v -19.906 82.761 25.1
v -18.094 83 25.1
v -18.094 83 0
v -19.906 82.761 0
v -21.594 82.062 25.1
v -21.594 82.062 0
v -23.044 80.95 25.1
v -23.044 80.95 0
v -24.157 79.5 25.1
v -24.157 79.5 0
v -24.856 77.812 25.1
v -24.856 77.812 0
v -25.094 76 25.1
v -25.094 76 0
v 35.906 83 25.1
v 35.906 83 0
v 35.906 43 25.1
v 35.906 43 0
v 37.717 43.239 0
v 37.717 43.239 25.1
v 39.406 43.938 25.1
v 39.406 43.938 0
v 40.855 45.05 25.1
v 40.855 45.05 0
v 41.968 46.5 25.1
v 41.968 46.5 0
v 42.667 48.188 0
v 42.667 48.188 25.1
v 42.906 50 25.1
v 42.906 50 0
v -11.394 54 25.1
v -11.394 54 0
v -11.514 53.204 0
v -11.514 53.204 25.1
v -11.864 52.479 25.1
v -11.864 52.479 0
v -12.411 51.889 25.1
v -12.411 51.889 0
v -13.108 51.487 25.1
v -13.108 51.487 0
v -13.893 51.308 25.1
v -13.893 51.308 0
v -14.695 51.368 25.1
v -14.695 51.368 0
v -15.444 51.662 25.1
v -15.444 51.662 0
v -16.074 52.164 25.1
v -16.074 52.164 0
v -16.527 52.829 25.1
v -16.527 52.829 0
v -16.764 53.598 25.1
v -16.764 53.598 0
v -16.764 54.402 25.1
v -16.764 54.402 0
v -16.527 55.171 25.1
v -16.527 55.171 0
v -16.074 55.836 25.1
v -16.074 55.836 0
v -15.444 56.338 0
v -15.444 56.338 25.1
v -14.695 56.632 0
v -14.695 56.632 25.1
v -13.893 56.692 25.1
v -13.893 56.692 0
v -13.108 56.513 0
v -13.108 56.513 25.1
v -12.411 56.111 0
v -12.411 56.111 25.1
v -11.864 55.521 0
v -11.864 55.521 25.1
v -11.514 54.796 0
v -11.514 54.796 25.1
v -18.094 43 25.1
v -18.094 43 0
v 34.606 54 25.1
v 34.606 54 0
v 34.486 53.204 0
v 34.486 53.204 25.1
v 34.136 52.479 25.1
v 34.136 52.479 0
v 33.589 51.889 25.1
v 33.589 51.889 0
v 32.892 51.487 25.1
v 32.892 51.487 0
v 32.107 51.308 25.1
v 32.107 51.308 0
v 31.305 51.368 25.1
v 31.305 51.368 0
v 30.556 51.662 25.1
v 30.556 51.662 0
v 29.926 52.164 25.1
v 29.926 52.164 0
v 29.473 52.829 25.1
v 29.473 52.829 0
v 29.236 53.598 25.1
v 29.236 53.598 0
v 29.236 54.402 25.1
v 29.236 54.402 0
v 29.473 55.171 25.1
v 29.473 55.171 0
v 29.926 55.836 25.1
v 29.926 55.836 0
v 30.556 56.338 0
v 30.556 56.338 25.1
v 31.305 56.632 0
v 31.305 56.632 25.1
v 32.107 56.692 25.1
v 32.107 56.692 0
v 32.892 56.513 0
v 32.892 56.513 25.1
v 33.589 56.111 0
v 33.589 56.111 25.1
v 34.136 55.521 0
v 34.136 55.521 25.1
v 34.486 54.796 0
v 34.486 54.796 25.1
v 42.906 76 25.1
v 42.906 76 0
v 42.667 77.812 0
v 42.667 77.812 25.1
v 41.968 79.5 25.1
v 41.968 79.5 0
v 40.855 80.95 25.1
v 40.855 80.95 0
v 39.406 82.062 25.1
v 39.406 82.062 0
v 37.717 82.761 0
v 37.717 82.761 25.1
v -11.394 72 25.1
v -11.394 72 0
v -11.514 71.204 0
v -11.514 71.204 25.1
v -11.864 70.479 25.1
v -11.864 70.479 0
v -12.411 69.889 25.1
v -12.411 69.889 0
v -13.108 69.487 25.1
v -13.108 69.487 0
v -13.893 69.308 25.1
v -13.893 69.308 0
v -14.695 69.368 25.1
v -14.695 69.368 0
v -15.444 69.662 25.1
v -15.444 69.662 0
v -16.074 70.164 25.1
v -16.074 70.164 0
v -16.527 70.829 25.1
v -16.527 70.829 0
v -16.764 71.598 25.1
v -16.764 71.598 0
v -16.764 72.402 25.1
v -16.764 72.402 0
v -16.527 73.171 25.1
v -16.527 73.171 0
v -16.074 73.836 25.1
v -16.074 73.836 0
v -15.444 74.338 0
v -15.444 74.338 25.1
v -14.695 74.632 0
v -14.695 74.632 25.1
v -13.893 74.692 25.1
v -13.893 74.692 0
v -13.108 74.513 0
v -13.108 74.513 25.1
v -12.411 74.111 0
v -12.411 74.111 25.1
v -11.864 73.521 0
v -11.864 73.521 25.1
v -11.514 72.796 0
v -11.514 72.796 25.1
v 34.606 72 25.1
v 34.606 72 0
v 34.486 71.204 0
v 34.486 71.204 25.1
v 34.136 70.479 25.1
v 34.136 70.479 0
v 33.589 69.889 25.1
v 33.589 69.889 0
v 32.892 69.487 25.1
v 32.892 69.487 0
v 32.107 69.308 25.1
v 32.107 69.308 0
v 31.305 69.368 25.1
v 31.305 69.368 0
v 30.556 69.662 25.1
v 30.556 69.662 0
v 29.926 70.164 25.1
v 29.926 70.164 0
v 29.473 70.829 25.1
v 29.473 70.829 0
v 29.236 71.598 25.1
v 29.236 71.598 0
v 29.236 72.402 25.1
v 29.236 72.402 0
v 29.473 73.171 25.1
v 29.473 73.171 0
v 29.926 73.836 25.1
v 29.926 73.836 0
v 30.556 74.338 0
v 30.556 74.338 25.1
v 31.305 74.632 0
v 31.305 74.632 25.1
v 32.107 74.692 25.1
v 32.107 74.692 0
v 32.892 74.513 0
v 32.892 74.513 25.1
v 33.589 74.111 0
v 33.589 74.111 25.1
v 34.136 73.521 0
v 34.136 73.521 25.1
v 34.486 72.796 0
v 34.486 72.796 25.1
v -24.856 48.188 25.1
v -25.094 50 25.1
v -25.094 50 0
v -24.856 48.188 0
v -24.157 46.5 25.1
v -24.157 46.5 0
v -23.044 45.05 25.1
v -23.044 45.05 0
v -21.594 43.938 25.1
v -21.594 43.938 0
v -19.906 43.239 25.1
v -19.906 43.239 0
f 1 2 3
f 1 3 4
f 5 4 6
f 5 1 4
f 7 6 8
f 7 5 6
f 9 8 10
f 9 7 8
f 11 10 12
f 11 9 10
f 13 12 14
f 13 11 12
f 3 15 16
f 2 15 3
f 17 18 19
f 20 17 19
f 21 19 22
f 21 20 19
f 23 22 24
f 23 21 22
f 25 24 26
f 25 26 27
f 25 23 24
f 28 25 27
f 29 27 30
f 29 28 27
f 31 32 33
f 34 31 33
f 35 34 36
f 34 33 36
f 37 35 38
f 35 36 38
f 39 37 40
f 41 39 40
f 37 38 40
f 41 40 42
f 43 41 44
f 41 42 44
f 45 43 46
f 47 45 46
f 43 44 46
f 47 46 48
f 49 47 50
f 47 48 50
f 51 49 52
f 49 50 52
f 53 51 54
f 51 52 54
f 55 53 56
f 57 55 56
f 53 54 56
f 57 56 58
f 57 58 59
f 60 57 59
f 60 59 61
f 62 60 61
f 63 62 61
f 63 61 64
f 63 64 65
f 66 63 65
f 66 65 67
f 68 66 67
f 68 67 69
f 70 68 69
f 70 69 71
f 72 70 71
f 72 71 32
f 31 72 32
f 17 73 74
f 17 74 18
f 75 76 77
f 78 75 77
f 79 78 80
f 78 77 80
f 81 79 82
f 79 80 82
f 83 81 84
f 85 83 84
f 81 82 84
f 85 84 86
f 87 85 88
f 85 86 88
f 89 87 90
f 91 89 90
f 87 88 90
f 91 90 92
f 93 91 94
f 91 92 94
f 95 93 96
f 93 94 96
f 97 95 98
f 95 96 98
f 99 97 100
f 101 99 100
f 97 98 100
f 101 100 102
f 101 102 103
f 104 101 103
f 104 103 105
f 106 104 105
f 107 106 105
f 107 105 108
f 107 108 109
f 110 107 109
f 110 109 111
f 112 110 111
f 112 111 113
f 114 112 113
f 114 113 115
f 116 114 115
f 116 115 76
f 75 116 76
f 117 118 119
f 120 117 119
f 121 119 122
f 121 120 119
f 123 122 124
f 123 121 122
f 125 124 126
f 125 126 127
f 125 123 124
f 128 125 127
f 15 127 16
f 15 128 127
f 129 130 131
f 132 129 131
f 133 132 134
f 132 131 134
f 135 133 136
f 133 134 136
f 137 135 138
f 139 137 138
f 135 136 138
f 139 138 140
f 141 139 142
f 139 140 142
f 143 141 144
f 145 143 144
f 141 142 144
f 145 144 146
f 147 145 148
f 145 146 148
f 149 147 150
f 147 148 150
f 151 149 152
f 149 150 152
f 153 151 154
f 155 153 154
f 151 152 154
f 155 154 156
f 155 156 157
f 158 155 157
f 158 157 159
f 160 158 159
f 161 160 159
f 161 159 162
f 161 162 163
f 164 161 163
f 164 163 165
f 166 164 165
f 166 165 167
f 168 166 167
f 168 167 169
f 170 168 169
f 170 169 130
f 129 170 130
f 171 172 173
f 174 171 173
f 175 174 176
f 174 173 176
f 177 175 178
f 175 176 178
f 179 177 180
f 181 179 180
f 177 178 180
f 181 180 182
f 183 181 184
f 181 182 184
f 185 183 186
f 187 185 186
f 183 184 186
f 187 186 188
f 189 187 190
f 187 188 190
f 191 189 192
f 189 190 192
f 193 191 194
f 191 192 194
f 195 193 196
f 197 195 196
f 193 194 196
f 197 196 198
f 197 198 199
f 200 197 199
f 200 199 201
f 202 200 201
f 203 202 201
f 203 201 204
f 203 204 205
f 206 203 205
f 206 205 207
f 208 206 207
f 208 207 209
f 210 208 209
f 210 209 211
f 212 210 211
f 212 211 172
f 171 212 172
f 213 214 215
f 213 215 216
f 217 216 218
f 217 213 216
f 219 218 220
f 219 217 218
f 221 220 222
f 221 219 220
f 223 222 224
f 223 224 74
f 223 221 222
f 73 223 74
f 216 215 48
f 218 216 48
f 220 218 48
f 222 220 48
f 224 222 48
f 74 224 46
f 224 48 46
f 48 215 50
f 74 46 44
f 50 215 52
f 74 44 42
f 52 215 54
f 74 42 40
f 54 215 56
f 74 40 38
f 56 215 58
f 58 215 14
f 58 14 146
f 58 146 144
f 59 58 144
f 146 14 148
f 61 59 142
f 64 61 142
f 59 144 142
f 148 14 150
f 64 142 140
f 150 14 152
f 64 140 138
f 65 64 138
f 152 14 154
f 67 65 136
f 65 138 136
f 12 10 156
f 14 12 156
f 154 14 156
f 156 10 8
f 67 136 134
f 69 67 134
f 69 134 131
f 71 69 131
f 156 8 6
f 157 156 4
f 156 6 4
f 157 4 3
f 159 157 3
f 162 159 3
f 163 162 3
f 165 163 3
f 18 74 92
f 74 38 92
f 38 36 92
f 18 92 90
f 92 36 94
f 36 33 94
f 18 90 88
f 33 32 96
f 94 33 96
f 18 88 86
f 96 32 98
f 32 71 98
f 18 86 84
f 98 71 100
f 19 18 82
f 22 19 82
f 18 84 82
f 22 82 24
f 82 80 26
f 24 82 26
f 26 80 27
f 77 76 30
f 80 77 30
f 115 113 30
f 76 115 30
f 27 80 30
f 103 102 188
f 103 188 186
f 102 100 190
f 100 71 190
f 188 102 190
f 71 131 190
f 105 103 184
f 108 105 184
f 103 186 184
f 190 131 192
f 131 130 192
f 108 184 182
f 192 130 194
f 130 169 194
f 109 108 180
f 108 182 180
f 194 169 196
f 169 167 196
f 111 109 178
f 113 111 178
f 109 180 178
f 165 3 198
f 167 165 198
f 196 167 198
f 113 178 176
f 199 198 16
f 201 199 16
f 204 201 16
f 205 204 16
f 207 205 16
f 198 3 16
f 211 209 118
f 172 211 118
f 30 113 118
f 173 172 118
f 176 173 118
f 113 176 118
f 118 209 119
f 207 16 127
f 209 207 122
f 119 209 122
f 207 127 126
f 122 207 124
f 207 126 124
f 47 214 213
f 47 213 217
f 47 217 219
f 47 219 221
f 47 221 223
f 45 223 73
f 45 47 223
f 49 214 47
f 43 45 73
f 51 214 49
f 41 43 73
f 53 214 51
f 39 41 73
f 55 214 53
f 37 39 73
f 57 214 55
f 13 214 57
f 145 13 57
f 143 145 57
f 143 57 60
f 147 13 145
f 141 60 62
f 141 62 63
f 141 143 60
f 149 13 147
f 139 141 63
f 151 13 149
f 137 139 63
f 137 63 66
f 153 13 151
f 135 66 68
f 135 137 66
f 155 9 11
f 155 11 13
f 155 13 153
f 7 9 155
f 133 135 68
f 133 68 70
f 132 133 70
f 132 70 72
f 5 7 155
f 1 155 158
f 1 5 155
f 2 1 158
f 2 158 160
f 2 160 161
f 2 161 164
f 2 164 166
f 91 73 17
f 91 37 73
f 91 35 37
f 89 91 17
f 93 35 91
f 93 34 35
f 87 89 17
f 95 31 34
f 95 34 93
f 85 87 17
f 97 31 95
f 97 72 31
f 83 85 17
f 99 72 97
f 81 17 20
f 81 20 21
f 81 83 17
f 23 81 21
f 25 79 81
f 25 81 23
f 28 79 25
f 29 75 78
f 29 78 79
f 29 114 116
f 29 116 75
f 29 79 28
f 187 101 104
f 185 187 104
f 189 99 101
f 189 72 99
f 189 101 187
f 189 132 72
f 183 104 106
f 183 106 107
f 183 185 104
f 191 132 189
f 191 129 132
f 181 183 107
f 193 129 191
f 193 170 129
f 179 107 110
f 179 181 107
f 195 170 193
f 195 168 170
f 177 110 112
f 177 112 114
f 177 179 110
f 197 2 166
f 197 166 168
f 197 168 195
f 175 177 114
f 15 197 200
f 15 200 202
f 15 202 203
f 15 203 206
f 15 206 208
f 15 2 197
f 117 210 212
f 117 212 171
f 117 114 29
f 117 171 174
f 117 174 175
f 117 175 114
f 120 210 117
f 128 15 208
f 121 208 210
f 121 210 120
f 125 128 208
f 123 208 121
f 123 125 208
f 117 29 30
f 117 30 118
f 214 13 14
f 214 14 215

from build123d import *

# Parameters (mm, degrees)
SKETCH1_W            = 59.999999999
SKETCH1_H            = 32
BOSS_EXTRUDE1_DEPTH  = 25.1
M5_CLEARANCE_HOLE1_D = 5.4
FILLET1_R            = 3
BOSS_EXTRUDE2_DEPTH  = 25.1


with BuildPart() as part:
    # Sketch1 → Boss-Extrude1 (new body)
    with BuildSketch(Plane.XY):
        with Locations((8.905545777, 63)):
            Rectangle(SKETCH1_W, SKETCH1_H)
    extrude(amount=BOSS_EXTRUDE1_DEPTH)

    # M5 Clearance Hole1 (through all)
    with Locations(Plane(origin=(0, 0, 25.1), x_dir=(-1, 0, 0), z_dir=(0, 0, 1))):
        with Locations((-31.905545776, -72), (-31.905545776, -54), (14.094454224, -54), (14.094454224, -72)):
            Hole(M5_CLEARANCE_HOLE1_D / 2)

    # Fillet1
    fillet1_edges = [part.edges().sort_by_distance(p)[0] for p in [
        (-21.094454223, 47, 12.55),
        (-21.094454223, 79, 12.55),
        (38.905545776, 79, 12.55),
        (38.905545776, 47, 12.55),
    ]]
    fillet(fillet1_edges, radius=FILLET1_R)

    # Sketch4 → Boss-Extrude2 (add)
    with BuildSketch(Plane.XY.offset(25.1)):
        with BuildLine():
            Line((42.905545776, 50), (42.905545776, 76))
            ThreePointArc((42.905545776, 76), (40.855293244, 80.949747468), (35.905545776, 83))
            Line((35.905545776, 83), (-18.094454223, 83))
            ThreePointArc((-18.094454223, 83), (-23.044201691, 80.949747468), (-25.094454223, 76))
            Line((-25.094454223, 76), (-25.094454223, 50))
            ThreePointArc((-25.094454223, 50), (-23.044201691, 45.050252532), (-18.094454223, 43))
            Line((-18.094454223, 43), (35.905545776, 43))
            ThreePointArc((35.905545776, 43), (40.855293244, 45.050252532), (42.905545776, 50))
        make_face()
        with BuildLine():
            Line((35.905545776, 79), (-18.094454223, 79))
            ThreePointArc((-18.094454223, 79), (-20.215774567, 78.121320343), (-21.094454223, 76))
            Line((-21.094454223, 76), (-21.094454223, 50))
            ThreePointArc((-21.094454223, 50), (-20.215774567, 47.878679656), (-18.094454223, 47))
            Line((-18.094454223, 47), (35.905545776, 47))
            ThreePointArc((35.905545776, 47), (38.026866119, 47.878679656), (38.905545776, 50))
            Line((38.905545776, 50), (38.905545776, 76))
            ThreePointArc((38.905545776, 76), (38.026866119, 78.121320343), (35.905545776, 79))
        make_face(mode=Mode.SUBTRACT)
    extrude(amount=-BOSS_EXTRUDE2_DEPTH)


solid = part.part
